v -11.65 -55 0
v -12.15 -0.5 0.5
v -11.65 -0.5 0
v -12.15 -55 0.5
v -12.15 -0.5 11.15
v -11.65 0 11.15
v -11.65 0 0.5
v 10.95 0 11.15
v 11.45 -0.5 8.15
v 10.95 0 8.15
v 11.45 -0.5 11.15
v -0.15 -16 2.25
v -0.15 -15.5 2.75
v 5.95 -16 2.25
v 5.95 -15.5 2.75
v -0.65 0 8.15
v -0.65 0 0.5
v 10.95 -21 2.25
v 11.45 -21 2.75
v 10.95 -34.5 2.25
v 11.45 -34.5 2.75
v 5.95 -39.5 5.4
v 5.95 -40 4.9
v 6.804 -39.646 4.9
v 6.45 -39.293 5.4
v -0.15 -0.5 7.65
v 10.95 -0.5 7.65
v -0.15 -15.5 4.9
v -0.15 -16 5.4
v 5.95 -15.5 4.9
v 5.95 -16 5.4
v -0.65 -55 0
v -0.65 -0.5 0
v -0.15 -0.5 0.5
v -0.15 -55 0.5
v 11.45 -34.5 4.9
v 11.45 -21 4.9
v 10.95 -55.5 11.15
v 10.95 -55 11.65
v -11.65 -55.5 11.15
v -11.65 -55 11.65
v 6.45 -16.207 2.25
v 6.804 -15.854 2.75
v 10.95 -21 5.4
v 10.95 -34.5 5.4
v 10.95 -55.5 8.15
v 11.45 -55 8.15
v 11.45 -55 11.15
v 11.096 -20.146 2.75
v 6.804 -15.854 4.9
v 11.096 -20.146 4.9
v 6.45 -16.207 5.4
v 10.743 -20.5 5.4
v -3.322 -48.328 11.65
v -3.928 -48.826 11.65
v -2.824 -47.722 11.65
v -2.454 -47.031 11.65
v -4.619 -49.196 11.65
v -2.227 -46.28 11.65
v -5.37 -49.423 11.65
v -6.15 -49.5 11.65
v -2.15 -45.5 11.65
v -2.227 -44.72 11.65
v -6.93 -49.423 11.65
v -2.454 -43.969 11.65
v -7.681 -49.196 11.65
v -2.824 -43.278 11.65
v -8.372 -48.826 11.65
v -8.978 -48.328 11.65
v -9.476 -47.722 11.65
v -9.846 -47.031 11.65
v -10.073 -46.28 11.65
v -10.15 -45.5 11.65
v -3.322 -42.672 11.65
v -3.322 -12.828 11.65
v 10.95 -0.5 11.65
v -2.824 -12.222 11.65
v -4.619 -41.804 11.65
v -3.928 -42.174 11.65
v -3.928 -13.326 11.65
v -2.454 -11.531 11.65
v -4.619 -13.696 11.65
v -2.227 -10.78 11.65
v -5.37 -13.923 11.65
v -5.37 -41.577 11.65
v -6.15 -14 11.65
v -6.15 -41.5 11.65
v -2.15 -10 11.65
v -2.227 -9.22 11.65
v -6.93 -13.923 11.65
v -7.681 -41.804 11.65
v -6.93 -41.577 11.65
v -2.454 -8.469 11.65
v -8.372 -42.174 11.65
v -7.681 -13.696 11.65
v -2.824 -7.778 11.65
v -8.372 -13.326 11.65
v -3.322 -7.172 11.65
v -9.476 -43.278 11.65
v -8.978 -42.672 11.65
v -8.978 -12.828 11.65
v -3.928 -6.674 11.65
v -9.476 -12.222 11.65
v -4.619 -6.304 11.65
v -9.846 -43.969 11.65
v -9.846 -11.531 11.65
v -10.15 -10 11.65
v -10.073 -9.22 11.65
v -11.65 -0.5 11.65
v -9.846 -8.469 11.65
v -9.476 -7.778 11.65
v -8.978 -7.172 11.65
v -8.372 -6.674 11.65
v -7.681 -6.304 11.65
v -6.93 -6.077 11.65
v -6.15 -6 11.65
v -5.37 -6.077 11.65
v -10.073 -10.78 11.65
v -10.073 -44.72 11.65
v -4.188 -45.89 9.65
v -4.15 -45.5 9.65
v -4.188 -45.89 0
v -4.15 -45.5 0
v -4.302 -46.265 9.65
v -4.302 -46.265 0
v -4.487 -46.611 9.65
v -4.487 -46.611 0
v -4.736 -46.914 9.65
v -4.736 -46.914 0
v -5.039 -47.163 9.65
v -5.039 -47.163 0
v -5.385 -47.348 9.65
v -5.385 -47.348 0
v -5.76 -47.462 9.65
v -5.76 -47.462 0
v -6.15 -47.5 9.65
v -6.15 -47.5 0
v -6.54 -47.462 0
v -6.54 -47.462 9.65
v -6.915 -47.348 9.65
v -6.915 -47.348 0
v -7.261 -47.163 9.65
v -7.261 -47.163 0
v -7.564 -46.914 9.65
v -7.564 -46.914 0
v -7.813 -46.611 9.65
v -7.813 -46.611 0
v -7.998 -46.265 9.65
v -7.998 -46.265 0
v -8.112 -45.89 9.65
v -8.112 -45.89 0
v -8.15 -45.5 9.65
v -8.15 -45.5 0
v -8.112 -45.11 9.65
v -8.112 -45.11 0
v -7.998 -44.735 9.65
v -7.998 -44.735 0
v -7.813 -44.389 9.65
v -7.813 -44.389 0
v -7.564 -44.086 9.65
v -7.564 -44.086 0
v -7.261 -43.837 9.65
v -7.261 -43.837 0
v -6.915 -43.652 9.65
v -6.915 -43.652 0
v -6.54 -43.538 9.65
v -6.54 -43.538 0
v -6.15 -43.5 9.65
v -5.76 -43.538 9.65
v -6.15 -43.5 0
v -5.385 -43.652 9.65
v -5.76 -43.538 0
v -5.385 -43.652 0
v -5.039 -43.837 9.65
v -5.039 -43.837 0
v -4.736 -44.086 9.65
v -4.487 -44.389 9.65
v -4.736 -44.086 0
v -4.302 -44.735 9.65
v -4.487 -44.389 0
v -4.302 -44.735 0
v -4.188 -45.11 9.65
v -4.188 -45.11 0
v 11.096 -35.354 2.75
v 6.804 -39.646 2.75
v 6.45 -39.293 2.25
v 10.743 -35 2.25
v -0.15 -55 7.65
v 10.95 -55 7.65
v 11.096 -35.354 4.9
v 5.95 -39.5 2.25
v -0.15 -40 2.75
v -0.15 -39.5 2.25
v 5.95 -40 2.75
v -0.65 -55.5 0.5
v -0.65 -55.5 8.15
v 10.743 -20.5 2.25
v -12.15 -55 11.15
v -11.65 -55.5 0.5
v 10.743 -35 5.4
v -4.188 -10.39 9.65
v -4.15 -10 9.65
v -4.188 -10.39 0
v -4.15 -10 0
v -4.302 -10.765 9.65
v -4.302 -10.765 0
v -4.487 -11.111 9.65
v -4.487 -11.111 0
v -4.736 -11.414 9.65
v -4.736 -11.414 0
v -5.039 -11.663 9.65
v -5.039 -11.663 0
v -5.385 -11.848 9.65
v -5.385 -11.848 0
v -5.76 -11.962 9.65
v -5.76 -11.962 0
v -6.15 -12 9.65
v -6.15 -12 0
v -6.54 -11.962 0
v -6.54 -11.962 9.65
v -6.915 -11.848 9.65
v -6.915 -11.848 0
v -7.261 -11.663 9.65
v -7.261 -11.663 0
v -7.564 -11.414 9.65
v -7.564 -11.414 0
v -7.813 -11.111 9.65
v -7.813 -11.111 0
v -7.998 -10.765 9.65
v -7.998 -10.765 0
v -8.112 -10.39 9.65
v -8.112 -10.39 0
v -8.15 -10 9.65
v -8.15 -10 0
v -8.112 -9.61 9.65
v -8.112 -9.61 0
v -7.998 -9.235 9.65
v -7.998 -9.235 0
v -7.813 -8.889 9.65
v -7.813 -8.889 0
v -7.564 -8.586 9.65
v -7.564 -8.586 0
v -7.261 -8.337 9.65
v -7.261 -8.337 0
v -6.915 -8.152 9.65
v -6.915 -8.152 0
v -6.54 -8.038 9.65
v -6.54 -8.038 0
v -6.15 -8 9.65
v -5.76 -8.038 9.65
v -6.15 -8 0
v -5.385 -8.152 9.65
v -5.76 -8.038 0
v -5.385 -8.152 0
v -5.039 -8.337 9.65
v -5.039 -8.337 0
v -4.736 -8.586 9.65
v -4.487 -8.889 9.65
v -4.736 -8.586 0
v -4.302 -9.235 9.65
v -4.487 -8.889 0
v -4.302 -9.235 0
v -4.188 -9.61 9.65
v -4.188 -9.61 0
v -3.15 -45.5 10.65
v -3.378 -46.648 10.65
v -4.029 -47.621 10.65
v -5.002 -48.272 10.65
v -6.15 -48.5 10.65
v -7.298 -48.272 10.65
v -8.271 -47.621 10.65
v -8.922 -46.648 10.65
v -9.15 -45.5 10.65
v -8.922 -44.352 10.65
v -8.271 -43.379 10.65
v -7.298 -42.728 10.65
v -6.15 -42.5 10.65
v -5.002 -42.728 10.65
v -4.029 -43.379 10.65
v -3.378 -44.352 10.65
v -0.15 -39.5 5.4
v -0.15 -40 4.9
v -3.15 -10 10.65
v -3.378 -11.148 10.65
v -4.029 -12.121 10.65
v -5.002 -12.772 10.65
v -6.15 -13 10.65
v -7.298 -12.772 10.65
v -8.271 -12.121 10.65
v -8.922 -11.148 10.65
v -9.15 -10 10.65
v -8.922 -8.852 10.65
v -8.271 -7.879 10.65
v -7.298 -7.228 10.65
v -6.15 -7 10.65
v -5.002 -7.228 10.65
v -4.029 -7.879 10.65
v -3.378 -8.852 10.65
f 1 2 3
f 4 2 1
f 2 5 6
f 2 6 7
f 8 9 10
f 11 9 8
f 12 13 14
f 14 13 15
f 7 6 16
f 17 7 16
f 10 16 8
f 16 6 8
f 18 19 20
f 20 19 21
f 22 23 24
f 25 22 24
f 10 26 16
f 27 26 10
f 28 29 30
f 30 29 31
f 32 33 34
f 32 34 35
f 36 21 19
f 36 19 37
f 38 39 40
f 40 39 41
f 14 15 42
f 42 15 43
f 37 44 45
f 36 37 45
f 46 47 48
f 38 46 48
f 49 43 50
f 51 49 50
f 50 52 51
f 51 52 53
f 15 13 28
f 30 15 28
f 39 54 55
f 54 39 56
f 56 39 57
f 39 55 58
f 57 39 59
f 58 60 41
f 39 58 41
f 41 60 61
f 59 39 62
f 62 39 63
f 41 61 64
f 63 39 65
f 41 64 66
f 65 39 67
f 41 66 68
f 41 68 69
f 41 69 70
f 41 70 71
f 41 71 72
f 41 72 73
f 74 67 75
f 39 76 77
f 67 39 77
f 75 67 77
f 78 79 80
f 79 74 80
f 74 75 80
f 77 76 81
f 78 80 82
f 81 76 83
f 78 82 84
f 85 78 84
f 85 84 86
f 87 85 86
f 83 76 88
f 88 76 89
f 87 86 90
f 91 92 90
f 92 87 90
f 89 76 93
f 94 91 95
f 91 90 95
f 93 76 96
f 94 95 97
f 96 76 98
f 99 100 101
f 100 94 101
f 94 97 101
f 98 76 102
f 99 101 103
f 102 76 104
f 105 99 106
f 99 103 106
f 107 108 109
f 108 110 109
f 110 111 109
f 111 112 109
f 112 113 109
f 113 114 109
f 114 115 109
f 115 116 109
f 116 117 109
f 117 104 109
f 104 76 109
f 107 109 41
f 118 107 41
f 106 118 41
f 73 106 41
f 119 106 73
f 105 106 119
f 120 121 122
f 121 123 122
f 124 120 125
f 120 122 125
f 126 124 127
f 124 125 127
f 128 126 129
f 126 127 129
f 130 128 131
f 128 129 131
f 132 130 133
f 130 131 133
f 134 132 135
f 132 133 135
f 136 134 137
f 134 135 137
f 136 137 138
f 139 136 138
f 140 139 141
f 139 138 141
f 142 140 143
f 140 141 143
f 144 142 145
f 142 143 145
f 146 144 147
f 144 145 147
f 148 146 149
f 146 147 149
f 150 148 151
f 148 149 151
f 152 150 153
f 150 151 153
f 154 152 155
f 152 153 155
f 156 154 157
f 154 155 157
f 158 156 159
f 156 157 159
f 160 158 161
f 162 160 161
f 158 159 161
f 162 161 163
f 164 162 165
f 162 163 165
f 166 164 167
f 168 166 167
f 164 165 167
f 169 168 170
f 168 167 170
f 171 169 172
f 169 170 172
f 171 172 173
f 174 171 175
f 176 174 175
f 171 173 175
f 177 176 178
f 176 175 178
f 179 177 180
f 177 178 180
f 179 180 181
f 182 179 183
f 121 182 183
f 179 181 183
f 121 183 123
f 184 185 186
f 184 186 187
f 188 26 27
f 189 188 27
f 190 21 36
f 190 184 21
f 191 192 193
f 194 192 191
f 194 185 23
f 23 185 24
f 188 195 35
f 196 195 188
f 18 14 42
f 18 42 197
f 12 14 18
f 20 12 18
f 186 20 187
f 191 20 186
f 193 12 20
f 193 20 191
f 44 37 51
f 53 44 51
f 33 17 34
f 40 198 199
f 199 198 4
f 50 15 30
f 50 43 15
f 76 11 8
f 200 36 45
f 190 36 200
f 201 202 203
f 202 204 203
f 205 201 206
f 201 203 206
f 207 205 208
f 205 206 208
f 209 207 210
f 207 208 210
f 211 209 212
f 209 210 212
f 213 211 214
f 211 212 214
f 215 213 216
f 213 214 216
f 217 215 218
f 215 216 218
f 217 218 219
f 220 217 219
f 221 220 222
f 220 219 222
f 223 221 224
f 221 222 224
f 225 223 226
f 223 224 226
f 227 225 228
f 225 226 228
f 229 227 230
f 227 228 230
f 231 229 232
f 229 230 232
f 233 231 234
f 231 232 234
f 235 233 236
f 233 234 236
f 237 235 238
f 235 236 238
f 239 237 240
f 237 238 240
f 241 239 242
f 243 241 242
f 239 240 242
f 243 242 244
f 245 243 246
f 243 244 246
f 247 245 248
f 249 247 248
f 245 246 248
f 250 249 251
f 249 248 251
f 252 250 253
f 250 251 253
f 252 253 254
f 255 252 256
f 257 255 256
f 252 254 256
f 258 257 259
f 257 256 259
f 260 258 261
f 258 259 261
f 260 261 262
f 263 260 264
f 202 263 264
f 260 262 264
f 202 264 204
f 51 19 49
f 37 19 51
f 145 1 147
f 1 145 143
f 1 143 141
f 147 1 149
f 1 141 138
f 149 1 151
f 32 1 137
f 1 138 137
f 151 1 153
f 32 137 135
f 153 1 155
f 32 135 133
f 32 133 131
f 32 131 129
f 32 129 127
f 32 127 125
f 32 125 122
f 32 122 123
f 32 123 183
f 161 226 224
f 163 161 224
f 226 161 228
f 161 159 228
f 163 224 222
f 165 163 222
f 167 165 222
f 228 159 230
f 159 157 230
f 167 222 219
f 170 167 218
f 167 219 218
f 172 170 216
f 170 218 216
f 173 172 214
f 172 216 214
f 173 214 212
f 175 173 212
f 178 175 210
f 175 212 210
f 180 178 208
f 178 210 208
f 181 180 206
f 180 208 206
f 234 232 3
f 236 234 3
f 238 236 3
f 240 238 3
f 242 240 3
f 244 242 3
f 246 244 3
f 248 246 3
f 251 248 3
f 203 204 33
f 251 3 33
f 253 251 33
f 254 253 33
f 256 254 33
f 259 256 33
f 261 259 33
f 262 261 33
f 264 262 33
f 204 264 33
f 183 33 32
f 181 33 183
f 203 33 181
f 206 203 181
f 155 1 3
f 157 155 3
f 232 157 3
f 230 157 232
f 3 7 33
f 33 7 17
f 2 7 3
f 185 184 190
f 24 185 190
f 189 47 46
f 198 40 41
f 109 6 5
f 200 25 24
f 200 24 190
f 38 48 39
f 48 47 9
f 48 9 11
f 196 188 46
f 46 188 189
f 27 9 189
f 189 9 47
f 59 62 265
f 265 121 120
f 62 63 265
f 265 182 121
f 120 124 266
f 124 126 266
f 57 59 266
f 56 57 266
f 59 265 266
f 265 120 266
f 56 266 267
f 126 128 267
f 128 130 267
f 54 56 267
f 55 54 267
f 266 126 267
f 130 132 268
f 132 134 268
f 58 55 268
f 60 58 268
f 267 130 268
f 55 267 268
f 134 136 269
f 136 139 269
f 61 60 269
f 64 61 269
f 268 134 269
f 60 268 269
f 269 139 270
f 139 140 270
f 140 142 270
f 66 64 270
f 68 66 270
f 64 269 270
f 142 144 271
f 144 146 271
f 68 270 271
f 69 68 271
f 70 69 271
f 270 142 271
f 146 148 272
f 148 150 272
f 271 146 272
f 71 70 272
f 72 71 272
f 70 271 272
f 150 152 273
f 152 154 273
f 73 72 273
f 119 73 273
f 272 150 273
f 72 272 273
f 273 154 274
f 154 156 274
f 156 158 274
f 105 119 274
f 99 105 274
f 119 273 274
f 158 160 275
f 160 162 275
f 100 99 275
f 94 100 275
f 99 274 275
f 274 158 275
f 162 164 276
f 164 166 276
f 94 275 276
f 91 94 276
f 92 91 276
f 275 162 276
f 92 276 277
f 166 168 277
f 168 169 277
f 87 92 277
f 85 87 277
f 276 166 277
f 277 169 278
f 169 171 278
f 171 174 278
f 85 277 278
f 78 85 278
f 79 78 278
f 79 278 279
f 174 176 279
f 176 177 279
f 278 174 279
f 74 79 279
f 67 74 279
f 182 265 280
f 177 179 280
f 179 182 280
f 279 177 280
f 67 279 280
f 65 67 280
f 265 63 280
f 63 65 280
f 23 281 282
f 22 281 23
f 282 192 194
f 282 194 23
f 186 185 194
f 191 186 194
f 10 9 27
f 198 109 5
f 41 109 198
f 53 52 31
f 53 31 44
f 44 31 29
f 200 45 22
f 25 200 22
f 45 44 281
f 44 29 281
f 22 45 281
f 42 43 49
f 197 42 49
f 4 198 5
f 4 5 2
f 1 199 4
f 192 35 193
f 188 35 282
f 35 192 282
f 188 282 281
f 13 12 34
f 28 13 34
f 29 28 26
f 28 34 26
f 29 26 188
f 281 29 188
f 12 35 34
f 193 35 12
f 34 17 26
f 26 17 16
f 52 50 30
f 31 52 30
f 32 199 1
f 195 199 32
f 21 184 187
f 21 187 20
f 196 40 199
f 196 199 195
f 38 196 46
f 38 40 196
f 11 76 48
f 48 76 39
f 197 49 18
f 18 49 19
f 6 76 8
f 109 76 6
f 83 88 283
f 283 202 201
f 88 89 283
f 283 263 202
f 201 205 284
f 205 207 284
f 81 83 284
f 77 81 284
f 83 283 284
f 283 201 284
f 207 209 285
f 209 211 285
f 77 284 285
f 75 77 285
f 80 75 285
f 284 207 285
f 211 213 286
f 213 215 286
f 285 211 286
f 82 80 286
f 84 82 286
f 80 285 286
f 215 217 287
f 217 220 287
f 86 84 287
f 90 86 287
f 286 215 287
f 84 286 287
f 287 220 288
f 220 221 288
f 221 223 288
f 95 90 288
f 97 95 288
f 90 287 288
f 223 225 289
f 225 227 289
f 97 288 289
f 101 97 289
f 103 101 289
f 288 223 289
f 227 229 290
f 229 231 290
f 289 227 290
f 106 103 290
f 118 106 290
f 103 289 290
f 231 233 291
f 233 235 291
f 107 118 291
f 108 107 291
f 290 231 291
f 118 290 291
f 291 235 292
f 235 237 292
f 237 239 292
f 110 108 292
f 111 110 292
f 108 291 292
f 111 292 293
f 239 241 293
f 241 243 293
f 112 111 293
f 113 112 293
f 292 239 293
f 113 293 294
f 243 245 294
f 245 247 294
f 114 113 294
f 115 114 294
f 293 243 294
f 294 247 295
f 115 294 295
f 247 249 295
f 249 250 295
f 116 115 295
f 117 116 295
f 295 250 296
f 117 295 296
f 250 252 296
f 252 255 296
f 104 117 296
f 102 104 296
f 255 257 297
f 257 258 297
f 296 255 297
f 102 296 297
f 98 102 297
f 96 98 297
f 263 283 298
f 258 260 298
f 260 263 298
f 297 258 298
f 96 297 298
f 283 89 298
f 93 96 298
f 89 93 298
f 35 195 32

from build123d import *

# Parameters (mm, degrees)
PAD_DEPTH        = 55.5
HOLE_D           = 4
HOLE_DEPTH       = 25
HOLE_CSINK_D     = 8
HOLE_CSINK_ANGLE = 90
SKETCH002_W      = 3.15
SKETCH002_H      = 24.5
PAD001_DEPTH     = 11.6
CHAMFER_SIZE     = 5
CHAMFER001_SIZE  = 0.5


with BuildPart() as part:
    # Sketch → Pad (new body)
    with BuildSketch(Plane.XZ):
        Polygon((-12.15, 0), (-0.15, 0), (-0.15, 7.65), (11.45, 7.65), (11.45, 11.65), (-12.15, 11.65), align=None)
    extrude(amount=PAD_DEPTH)

    # Hole
    with Locations(Plane(origin=(0, 0, 11.65), x_dir=(-1, 0, 0), z_dir=(0, 0, 1))):
        with Locations((6.15, 10), (6.15, 45.5)):
            CounterSinkHole(HOLE_D / 2, HOLE_CSINK_D / 2, depth=HOLE_DEPTH, counter_sink_angle=HOLE_CSINK_ANGLE)

    # Sketch002 (on Face5 of Hole) → Pad001 (join)
    with BuildSketch(Plane(origin=(-0.15, 0, 0), x_dir=(0, 0, 1), z_dir=(1, 0, 0))):
        with Locations((3.825, 27.75)):
            Rectangle(SKETCH002_W, SKETCH002_H)
    extrude(amount=PAD001_DEPTH)

    # Chamfer
    chamfer_edges = [part.edges().sort_by_distance(p)[0] for p in [
        (11.45, -15.5, 3.825),
        (11.45, -40, 3.825),
    ]]
    chamfer(chamfer_edges, length=CHAMFER_SIZE)

    # Chamfer001
    chamfer001_edges = [part.edges().sort_by_distance(p)[0] for p in [
        (11.45, -27.75, 7.65),
        (11.45, -27.75, 11.65),
        (11.45, 0, 9.65),
        (11.45, -55.5, 9.65),
        (-6.15, -55.5, 0),
        (-0.15, -55.5, 3.825),
        (5.65, -55.5, 7.65),
        (-0.35, -55.5, 11.65),
        (-12.15, -55.5, 5.825),
        (-6.15, 0, 0),
        (-0.15, 0, 3.825),
        (5.65, 0, 7.65),
        (-0.35, 0, 11.65),
        (-12.15, 0, 5.825),
        (-12.15, -27.75, 11.65),
        (-12.15, -27.75, 0),
        (11.45, -27.75, 2.25),
        (11.45, -35, 3.825),
        (11.45, -20.5, 3.825),
        (11.45, -27.75, 5.4),
        (8.95, -18, 2.25),
        (6.45, -15.5, 3.825),
        (8.95, -18, 5.4),
        (8.95, -37.5, 5.4),
        (6.45, -40, 3.825),
        (8.95, -37.5, 2.25),
        (3.15, -40, 2.25),
        (3.15, -40, 5.4),
        (3.15, -15.5, 2.25),
        (3.15, -15.5, 5.4),
        (-0.15, -27.75, 0),
    ]]
    chamfer(chamfer001_edges, length=CHAMFER001_SIZE)


solid = part.part
